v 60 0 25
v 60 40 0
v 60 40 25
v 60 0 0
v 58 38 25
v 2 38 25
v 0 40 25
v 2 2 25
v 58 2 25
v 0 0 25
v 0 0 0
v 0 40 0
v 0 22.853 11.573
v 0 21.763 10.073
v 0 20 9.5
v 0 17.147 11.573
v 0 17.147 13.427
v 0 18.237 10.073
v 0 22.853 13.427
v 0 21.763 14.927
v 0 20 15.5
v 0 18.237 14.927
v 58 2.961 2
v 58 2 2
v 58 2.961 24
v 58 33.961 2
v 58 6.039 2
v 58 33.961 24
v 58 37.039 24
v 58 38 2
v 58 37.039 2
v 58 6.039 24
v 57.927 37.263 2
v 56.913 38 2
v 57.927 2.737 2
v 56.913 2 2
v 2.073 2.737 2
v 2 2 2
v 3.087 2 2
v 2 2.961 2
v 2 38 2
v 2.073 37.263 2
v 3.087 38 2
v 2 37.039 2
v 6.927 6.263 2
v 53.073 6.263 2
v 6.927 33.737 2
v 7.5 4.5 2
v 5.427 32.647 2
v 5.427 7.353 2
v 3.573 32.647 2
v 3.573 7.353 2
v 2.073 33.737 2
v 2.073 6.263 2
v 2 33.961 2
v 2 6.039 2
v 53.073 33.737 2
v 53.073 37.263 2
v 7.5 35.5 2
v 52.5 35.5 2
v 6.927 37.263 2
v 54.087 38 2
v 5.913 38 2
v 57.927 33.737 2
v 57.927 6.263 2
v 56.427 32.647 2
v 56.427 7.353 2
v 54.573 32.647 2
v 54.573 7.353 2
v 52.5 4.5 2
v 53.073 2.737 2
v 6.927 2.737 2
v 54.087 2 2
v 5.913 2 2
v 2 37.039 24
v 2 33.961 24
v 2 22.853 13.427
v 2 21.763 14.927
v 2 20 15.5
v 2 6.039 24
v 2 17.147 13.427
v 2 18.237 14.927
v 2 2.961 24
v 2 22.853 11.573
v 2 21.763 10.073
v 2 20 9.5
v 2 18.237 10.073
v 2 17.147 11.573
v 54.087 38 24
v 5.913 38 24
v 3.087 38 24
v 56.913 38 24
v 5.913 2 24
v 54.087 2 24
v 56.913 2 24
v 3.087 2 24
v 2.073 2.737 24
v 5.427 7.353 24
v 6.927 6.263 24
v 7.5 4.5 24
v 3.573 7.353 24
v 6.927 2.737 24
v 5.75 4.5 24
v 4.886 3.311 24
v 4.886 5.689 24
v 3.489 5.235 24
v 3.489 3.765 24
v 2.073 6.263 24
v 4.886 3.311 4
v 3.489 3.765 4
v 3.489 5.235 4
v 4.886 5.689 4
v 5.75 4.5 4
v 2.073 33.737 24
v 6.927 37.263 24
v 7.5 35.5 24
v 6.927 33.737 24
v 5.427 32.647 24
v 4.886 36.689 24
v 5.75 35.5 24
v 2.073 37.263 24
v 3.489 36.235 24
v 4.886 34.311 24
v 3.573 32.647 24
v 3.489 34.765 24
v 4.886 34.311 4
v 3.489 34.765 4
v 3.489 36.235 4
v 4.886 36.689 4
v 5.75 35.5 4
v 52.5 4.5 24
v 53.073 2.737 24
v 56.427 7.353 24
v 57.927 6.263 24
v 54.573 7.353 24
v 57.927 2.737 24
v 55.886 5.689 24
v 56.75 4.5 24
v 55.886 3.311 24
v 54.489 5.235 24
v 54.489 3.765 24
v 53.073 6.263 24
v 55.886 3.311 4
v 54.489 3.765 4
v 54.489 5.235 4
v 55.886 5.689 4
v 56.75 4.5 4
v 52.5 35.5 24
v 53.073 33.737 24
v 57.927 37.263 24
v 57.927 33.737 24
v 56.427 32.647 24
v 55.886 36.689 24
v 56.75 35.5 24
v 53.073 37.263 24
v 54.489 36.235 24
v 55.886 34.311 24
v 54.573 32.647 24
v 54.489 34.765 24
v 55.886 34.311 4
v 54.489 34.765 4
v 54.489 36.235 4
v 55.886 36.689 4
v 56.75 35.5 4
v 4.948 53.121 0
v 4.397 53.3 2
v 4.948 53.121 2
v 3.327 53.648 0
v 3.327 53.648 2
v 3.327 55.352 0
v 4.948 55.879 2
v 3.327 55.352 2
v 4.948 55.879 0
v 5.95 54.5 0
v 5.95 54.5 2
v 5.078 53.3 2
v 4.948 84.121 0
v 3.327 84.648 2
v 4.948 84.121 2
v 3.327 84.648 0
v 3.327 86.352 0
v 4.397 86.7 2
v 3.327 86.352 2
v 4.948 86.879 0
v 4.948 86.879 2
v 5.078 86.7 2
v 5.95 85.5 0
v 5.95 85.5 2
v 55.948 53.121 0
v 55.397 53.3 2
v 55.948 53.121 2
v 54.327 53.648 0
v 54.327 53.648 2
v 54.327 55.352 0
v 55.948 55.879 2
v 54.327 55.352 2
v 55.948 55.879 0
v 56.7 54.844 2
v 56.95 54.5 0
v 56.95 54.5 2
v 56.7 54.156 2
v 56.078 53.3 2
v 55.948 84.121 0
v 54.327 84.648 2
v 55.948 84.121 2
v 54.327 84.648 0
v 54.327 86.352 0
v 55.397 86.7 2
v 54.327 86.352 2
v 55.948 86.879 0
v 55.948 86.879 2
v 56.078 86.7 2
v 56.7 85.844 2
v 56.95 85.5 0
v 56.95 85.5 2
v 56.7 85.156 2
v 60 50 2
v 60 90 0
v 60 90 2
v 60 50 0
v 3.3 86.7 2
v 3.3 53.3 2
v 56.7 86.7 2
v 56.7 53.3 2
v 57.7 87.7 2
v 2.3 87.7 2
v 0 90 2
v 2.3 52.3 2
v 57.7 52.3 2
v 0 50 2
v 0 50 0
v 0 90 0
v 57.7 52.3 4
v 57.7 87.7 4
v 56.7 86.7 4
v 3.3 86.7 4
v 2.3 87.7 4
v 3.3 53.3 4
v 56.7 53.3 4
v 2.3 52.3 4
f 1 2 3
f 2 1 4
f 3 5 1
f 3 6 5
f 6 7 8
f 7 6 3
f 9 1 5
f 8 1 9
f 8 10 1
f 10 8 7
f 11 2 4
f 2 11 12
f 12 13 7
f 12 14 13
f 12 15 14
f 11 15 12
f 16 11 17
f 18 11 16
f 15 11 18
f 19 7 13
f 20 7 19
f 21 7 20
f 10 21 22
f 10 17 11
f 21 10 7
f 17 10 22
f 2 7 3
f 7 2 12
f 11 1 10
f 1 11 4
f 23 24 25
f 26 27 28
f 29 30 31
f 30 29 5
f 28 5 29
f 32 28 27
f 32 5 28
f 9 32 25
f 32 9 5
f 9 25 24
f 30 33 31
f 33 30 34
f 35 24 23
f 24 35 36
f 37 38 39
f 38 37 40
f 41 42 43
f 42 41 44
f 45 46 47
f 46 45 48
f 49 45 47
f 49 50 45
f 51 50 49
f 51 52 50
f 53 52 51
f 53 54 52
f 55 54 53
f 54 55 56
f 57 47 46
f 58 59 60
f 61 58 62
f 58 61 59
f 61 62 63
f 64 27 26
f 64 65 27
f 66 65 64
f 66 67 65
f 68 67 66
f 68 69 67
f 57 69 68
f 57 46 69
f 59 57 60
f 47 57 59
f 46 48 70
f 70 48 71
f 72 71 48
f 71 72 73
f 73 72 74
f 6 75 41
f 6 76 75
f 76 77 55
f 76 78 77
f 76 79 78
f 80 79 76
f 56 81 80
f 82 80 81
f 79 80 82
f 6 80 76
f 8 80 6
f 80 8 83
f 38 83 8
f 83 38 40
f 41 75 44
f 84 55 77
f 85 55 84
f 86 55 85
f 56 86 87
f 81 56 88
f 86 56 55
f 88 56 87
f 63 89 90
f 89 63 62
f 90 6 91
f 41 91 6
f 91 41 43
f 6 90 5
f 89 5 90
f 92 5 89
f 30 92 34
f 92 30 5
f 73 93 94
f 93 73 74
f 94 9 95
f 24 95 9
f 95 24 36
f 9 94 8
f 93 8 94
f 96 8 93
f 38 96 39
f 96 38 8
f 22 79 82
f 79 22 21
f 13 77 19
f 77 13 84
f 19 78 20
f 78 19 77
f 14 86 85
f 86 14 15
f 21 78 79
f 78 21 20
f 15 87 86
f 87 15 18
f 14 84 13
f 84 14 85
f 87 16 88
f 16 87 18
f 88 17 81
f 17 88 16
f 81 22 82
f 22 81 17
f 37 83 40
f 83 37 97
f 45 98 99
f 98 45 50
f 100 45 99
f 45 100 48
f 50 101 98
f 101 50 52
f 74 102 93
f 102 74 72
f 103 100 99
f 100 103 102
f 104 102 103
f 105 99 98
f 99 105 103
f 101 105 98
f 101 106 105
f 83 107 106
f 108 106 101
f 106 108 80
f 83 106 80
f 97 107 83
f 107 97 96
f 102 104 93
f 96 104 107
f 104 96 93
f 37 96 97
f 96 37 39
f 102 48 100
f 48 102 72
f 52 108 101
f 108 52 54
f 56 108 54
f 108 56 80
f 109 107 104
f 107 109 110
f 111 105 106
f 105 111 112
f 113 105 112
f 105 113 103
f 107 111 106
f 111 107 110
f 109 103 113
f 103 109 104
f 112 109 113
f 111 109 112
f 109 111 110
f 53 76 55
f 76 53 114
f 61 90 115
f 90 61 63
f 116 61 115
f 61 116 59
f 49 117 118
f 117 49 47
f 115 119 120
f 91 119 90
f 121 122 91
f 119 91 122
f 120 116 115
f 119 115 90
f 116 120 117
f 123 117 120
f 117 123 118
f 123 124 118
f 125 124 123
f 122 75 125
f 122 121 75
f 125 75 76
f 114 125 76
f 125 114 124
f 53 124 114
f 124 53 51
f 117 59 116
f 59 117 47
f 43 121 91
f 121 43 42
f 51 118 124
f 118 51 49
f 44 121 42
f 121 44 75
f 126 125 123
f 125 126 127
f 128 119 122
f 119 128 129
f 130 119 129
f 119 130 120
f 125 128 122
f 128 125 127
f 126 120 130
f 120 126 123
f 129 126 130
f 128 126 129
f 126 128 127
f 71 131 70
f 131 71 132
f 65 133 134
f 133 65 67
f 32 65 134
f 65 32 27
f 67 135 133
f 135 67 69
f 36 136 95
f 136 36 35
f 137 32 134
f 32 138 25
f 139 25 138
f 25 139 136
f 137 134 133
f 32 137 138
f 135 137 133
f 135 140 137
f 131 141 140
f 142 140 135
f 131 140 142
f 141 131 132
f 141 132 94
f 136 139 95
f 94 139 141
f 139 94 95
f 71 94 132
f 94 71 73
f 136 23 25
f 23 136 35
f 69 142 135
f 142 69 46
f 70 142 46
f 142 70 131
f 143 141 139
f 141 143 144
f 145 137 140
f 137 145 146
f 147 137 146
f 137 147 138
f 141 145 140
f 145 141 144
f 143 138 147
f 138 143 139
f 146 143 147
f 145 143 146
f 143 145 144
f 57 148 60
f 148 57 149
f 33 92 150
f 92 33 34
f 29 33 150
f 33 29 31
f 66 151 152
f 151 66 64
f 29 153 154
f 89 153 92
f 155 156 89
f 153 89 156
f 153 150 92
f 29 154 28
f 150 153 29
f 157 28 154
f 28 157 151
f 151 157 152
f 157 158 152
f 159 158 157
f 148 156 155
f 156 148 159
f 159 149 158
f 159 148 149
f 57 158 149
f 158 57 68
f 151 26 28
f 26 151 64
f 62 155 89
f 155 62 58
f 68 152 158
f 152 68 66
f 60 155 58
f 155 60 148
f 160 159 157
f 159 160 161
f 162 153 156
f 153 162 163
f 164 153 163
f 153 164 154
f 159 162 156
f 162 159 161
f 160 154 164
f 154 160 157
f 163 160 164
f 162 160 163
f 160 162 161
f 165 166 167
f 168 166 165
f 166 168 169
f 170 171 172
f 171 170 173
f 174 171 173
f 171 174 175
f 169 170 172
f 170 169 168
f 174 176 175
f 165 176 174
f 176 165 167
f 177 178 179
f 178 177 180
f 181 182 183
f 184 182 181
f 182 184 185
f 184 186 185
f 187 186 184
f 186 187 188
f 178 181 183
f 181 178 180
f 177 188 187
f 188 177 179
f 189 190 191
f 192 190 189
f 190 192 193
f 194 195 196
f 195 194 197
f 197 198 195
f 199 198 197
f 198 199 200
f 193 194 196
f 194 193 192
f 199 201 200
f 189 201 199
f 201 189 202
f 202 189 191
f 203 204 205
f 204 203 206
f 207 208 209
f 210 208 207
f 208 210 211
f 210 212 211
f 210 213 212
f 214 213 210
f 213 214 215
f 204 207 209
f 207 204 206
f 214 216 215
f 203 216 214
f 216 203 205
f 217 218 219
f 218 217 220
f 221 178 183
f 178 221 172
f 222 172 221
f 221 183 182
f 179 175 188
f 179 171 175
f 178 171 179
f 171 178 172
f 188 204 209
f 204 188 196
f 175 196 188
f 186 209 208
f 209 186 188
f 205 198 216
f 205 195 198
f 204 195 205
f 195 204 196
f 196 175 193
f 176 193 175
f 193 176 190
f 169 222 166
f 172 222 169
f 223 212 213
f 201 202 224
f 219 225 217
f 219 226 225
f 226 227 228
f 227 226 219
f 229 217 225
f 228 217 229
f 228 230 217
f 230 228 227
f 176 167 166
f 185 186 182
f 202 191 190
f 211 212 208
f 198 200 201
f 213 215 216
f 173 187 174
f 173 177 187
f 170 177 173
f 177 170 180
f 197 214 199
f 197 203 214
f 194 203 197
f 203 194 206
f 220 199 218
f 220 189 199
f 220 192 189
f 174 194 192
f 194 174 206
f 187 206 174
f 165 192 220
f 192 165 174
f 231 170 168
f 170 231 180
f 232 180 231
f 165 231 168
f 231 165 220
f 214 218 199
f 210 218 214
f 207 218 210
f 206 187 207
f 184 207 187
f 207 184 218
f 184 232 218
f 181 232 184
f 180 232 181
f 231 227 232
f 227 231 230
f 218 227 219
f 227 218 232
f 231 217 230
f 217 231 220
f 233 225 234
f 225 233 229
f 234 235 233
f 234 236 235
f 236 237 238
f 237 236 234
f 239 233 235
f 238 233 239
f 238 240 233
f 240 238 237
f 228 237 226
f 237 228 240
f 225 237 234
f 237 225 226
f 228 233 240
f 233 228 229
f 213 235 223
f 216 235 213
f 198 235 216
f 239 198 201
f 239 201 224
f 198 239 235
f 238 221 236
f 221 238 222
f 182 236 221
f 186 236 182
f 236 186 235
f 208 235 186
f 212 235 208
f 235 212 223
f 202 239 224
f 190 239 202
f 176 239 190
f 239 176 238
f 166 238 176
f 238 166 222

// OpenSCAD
// Zweck: Elektronikbox mit Deckel und vier Schraubendomen; Deckel liegt druckfertig daneben.
w = 60; d = 40; h = 25; t = 2;
dome_d = 6; screw_d = 2.5; inset = 4.5;   // Dome überlappen die Wand (kein Berührpunkt)

module domes(hh) {
    for (x = [inset, w - inset], y = [inset, d - inset])
        translate([x, y, 0]) difference() {
            cylinder(h = hh, d = dome_d);
            translate([0, 0, 2]) cylinder(h = hh, d = screw_d);
        }
}

module box() {
    difference() {
        cube([w, d, h]);
        translate([t, t, t]) cube([w - 2 * t, d - 2 * t, h]);
        // Kabeldurchführung
        translate([-1, d / 2, h / 2]) rotate([0, 90, 0]) cylinder(h = t + 2, d = 6);
    }
    translate([0, 0, t]) domes(h - t - 1);
}

module lid() {
    difference() {
        cube([w, d, t]);
        for (x = [inset, w - inset], y = [inset, d - inset])
            translate([x, y, -1]) cylinder(h = t + 2, d = screw_d + 0.4);
    }
    // Zentrierrand
    translate([t + 0.3, t + 0.3, t]) difference() {
        cube([w - 2 * t - 0.6, d - 2 * t - 0.6, 2]);
        translate([1, 1, -1]) cube([w - 2 * t - 2.6, d - 2 * t - 2.6, 4]);
    }
}

echo(inner = [w - 2 * t, d - 2 * t, h - t]);
box();
translate([0, d + 10, 0]) lid();
